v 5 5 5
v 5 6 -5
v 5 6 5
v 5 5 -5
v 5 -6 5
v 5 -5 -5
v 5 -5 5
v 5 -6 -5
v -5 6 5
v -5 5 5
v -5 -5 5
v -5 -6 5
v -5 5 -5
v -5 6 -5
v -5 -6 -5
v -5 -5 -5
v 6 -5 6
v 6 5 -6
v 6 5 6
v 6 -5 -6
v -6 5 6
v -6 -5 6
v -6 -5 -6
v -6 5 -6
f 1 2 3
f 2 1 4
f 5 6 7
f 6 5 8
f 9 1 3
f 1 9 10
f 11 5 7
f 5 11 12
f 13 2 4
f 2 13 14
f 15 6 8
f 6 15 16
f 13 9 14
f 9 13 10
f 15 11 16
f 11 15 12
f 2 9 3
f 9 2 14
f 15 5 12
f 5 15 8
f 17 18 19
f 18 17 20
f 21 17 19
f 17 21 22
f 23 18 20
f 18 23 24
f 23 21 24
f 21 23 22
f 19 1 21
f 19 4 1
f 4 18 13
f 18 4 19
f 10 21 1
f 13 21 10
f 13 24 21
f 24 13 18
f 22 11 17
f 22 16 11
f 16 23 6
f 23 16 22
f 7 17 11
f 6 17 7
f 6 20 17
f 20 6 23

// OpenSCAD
// Unit of length: Unit.MM
union()
{
   color(c = [1.0, 0.0, 0.0, 1.0])
   {
      cube(size = [10.0, 12.0, 10.0], center = true);
   }
   cube(size = [12.0, 10.0, 12.0], center = true);
}
